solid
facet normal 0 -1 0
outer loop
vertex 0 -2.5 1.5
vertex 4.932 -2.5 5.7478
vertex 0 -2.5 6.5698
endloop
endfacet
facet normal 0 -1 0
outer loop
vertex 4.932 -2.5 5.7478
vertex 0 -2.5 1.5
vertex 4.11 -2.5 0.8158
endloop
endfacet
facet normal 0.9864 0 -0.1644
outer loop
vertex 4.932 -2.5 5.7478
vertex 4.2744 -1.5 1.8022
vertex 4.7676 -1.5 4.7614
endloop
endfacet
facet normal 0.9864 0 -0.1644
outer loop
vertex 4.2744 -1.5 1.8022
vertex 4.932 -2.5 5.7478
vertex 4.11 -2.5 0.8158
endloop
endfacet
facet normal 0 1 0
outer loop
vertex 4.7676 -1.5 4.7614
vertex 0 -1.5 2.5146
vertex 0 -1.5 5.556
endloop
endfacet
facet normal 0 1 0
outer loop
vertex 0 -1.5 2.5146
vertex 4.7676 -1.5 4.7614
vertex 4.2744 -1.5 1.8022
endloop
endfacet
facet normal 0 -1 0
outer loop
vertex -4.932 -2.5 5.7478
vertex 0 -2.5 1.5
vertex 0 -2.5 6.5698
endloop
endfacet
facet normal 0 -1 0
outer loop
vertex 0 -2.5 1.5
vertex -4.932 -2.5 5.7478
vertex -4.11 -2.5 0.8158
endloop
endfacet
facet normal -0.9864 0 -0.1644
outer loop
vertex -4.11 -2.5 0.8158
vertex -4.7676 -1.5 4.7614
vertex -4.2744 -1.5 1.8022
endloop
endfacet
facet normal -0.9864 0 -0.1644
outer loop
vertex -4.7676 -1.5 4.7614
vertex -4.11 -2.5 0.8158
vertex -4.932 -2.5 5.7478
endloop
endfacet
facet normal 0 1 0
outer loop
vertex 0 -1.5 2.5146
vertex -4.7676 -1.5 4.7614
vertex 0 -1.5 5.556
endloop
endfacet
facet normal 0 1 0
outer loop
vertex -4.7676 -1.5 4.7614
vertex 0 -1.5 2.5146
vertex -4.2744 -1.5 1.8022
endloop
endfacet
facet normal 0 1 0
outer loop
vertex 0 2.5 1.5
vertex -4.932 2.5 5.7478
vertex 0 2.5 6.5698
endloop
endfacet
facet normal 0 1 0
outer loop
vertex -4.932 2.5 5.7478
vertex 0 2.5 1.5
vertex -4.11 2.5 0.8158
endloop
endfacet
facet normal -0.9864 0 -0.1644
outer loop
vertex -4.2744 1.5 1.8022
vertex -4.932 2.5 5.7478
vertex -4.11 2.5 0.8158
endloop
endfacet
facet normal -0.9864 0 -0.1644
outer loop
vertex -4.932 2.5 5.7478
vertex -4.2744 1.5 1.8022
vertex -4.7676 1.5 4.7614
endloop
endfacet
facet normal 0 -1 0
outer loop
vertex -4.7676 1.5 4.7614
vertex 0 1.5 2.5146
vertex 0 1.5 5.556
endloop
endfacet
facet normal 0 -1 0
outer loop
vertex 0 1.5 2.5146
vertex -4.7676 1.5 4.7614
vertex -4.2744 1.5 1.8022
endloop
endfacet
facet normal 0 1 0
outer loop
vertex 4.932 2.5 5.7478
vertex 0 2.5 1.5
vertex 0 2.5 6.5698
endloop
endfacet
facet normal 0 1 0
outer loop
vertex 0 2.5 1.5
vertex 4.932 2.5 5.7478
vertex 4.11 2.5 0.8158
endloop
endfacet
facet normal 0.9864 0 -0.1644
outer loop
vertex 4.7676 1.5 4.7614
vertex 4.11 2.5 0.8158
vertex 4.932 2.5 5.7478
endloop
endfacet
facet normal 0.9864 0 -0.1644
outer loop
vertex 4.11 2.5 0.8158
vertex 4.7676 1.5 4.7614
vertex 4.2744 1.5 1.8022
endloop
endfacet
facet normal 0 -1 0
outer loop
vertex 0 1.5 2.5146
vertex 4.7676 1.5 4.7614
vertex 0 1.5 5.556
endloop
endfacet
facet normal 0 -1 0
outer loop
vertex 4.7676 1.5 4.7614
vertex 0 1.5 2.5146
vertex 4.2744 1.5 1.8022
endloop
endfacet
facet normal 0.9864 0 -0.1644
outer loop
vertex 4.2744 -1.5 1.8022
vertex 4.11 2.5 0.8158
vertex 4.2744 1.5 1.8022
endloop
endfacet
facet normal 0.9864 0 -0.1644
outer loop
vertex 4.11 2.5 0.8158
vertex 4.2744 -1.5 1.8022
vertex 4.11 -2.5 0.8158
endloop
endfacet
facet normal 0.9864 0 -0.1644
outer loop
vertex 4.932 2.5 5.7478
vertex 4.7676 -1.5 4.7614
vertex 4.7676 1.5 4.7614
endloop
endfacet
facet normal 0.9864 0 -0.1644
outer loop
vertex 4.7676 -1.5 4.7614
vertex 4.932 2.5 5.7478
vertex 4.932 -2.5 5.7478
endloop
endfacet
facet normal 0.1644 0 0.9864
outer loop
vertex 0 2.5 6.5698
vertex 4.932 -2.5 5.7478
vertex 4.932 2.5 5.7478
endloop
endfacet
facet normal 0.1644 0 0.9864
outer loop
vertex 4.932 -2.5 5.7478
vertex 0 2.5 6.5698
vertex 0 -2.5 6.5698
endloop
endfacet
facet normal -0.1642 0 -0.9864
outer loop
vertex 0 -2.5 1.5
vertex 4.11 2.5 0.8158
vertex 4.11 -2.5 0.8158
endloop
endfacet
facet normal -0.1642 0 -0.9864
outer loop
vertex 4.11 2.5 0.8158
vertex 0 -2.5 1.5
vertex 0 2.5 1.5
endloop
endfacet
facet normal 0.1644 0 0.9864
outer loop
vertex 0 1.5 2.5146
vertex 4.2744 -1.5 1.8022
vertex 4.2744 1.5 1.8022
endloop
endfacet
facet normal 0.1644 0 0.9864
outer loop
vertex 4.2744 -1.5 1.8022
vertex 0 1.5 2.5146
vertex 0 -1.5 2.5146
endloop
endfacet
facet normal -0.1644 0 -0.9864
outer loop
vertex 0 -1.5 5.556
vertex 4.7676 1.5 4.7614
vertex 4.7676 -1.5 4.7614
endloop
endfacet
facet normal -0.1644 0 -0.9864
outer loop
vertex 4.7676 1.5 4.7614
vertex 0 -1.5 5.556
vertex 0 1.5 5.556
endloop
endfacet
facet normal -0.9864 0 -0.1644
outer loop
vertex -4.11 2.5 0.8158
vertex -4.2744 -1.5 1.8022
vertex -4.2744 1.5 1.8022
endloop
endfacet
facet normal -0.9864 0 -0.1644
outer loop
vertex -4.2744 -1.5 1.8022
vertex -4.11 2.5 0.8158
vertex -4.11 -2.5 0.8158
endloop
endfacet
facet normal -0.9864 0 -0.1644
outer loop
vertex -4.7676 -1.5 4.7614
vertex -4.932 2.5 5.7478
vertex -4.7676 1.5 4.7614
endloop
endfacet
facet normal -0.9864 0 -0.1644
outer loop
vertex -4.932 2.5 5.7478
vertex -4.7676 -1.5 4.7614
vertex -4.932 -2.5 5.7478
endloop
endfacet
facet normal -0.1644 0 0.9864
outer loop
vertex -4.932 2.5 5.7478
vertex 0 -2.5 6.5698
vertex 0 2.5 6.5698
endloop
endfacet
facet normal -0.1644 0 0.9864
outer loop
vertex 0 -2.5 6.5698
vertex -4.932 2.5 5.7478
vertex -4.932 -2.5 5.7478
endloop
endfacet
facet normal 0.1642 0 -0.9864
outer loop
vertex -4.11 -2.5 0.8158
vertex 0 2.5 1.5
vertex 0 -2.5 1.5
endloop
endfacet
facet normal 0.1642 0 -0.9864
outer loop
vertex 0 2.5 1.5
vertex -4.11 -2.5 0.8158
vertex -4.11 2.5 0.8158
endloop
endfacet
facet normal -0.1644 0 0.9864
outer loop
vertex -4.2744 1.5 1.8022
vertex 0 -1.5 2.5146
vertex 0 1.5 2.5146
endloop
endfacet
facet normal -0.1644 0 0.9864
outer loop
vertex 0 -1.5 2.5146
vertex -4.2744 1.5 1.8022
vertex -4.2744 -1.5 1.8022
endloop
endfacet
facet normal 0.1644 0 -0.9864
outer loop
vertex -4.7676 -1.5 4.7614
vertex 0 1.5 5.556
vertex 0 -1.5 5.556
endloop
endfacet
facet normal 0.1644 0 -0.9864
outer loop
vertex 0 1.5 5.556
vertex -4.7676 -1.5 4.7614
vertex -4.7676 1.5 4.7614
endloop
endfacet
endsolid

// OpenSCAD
// file: s/u7035s01.scad
use <../../lib.scad>
function ldraw_lib__s__u7035s01() = [
// 0 ~Modulex Angled Brick 9 2 x 1 Double - Side
// 0 Name: s\u7035s01.dat
// 0 Author: Magnus Forsberg [MagFors]
// 0 !LDRAW_ORG Subpart UPDATE 2025-09
// 0 !LICENSE Licensed under CC BY 4.0 : see CAreadme.txt
// 
// 0 BFC CERTIFY CCW
  [0,"BFC","CERTIFY"],
  [0,"BFC","CCW"],
// 
// 0 !HISTORY 2025-09-29 [OrionP] Official Update 2025-09
// 
// 4 16 0 -16.4245 0 0 -3.75 0 10.274942 -2.039593 0 12.329925 -14.369517 0
  [4,16,0,-16.4245,0,0,-3.75,0,10.274942,-2.039593,0,12.329925,-14.369517,0],
// 4 16 10.274942 -2.039593 0 10.685939 -4.505578 2.5 11.918928 -11.903532 2.5 12.329925 -14.369517 0
  [4,16,10.274942,-2.039593,0,10.685939,-4.505578,2.5,11.918928,-11.903532,2.5,12.329925,-14.369517,0],
// 4 16 0 -6.286563 2.5 0 -13.890016 2.5 11.918928 -11.903532 2.5 10.685939 -4.505578 2.5
  [4,16,0,-6.286563,2.5,0,-13.890016,2.5,11.918928,-11.903532,2.5,10.685939,-4.505578,2.5],
// 2 24 10.685939 -4.505578 2.5 11.918928 -11.903532 2.5
  [2,24,10.685939,-4.505578,2.5,11.918928,-11.903532,2.5],
// 2 24 12.329925 -14.369517 0 10.274942 -2.039593 0
  [2,24,12.329925,-14.369517,0,10.274942,-2.039593,0],
// 2 24 10.274942 -2.039593 0 0 -3.75 0
  [2,24,10.274942,-2.039593,0,0,-3.75,0],
// 2 24 0 -6.286563 2.5 10.685939 -4.505578 2.5
  [2,24,0,-6.286563,2.5,10.685939,-4.505578,2.5],
// 2 24 0 -13.890016 2.5 11.918928 -11.903532 2.5
  [2,24,0,-13.890016,2.5,11.918928,-11.903532,2.5],
// 2 24 0 -16.4245 0 12.329925 -14.369517 0
  [2,24,0,-16.4245,0,12.329925,-14.369517,0],
// 4 16 -10.274942 -2.039593 0 0 -3.75 0 0 -16.4245 0 -12.329925 -14.369517 0
  [4,16,-10.274942,-2.039593,0,0,-3.75,0,0,-16.4245,0,-12.329925,-14.369517,0],
// 4 16 -11.918928 -11.903532 2.5 -10.685939 -4.505578 2.5 -10.274942 -2.039593 0 -12.329925 -14.369517 0
  [4,16,-11.918928,-11.903532,2.5,-10.685939,-4.505578,2.5,-10.274942,-2.039593,0,-12.329925,-14.369517,0],
// 4 16 -11.918928 -11.903532 2.5 0 -13.890016 2.5 0 -6.286563 2.5 -10.685939 -4.505578 2.5
  [4,16,-11.918928,-11.903532,2.5,0,-13.890016,2.5,0,-6.286563,2.5,-10.685939,-4.505578,2.5],
// 2 24 -11.918928 -11.903532 2.5 -10.685939 -4.505578 2.5
  [2,24,-11.918928,-11.903532,2.5,-10.685939,-4.505578,2.5],
// 2 24 -10.274942 -2.039593 0 -12.329925 -14.369517 0
  [2,24,-10.274942,-2.039593,0,-12.329925,-14.369517,0],
// 2 24 0 -3.75 0 -10.274942 -2.039593 0
  [2,24,0,-3.75,0,-10.274942,-2.039593,0],
// 2 24 -10.685939 -4.505578 2.5 0 -6.286563 2.5
  [2,24,-10.685939,-4.505578,2.5,0,-6.286563,2.5],
// 2 24 -11.918928 -11.903532 2.5 0 -13.890016 2.5
  [2,24,-11.918928,-11.903532,2.5,0,-13.890016,2.5],
// 2 24 -12.329925 -14.369517 0 0 -16.4245 0
  [2,24,-12.329925,-14.369517,0,0,-16.4245,0],
];
module ldraw_lib__s__u7035s01(step=0, col=false, unit=2/5, alt=false, line=0.2, solid=!$preview)
    makepoly(ldraw_lib__s__u7035s01(), step=step, col=col, unit=unit, alt=alt, line=line, solid=solid);
ldraw_lib__s__u7035s01(line=0.2);
// main file
use <../lib.scad>
use <s/u7035s01.scad>
function ldraw_lib__u7035() = [
// 0 Modulex Brick Angled 9 2 x 1 Double
// 0 Name: u7035.dat
// 0 Author: Magnus Forsberg [MagFors]
// 0 !LDRAW_ORG Part UPDATE 2025-09
// 0 !LICENSE Licensed under CC BY 4.0 : see CAreadme.txt
// 
// 0 !HELP 1 16 25 12.5 0 1 0 0 0 1 0 0 0 1 u7033.dat
// 0 !HELP 1 35 11.302 -8.205 0 0 .986 .164 0 .164 -.986 -1 0 0 u7000.dat
// 
// 0 BFC CERTIFY CCW
  [0,"BFC","CERTIFY"],
  [0,"BFC","CCW"],
// 
// 0 !KEYWORDS 9.4623 degree, Bricklink Mx2406A, Rebrickable 2406A, slope 1:6
// 
// 0 !HISTORY 2025-09-29 [OrionP] Official Update 2025-09
// 
// 1 16 0 0 -6.25 1 0 0 0 1 0 0 0 1 s\u7035s01.dat
  [1,16,0,0,-6.25,1,0,0,0,1,0,0,0,1, ldraw_lib__s__u7035s01()],
// 1 16 0 0 6.25 -1 0 0 0 1 0 0 0 -1 s\u7035s01.dat
  [1,16,0,0,6.25,-1,0,0,0,1,0,0,0,-1, ldraw_lib__s__u7035s01()],
// 
// 2 24 0 -13.890016 3.75 0 -13.890016 -3.75
  [2,24,0,-13.890016,3.75,0,-13.890016,-3.75],
// 2 24 0 -6.286563 -3.75 0 -6.286563 3.75
  [2,24,0,-6.286563,-3.75,0,-6.286563,3.75],
// 2 24 0 -16.4245 -6.25 0 -16.4245 6.25
  [2,24,0,-16.4245,-6.25,0,-16.4245,6.25],
// 2 24 0 -3.75 -6.25 0 -3.75 6.25
  [2,24,0,-3.75,-6.25,0,-3.75,6.25],
// 
// 4 16 10.274942 -2.039593 -6.25 10.274942 -2.039593 6.25 10.685939 -4.505578 3.75 10.685939 -4.505578 -3.75
  [4,16,10.274942,-2.039593,-6.25,10.274942,-2.039593,6.25,10.685939,-4.505578,3.75,10.685939,-4.505578,-3.75],
// 4 16 12.329925 -14.369517 -6.25 11.918928 -11.903532 -3.75 11.918928 -11.903532 3.75 12.329925 -14.369517 6.25
  [4,16,12.329925,-14.369517,-6.25,11.918928,-11.903532,-3.75,11.918928,-11.903532,3.75,12.329925,-14.369517,6.25],
// 4 16 12.329925 -14.369517 -6.25 12.329925 -14.369517 6.25 0 -16.4245 6.25 0 -16.4245 -6.25
  [4,16,12.329925,-14.369517,-6.25,12.329925,-14.369517,6.25,0,-16.4245,6.25,0,-16.4245,-6.25],
// 4 16 0 -3.75 6.25 10.274942 -2.039593 6.25 10.274942 -2.039593 -6.25 0 -3.75 -6.25
  [4,16,0,-3.75,6.25,10.274942,-2.039593,6.25,10.274942,-2.039593,-6.25,0,-3.75,-6.25],
// 
// 4 16 0 -6.286563 3.75 0 -6.286563 -3.75 10.685939 -4.505578 -3.75 10.685939 -4.505578 3.75
  [4,16,0,-6.286563,3.75,0,-6.286563,-3.75,10.685939,-4.505578,-3.75,10.685939,-4.505578,3.75],
// 4 16 0 -13.890016 3.75 11.918928 -11.903532 3.75 11.918928 -11.903532 -3.75 0 -13.890016 -3.75
  [4,16,0,-13.890016,3.75,11.918928,-11.903532,3.75,11.918928,-11.903532,-3.75,0,-13.890016,-3.75],
// 
// 2 24 12.329925 -14.369517 -6.25 12.329925 -14.369517 6.25
  [2,24,12.329925,-14.369517,-6.25,12.329925,-14.369517,6.25],
// 2 24 11.918928 -11.903532 -3.75 11.918928 -11.903532 3.75
  [2,24,11.918928,-11.903532,-3.75,11.918928,-11.903532,3.75],
// 2 24 10.274942 -2.039593 -6.25 10.274942 -2.039593 6.25
  [2,24,10.274942,-2.039593,-6.25,10.274942,-2.039593,6.25],
// 2 24 10.685939 -4.505578 3.75 10.685939 -4.505578 -3.75
  [2,24,10.685939,-4.505578,3.75,10.685939,-4.505578,-3.75],
// 
// 4 16 -10.685939 -4.505578 3.75 -10.274942 -2.039593 6.25 -10.274942 -2.039593 -6.25 -10.685939 -4.505578 -3.75
  [4,16,-10.685939,-4.505578,3.75,-10.274942,-2.039593,6.25,-10.274942,-2.039593,-6.25,-10.685939,-4.505578,-3.75],
// 4 16 -11.918928 -11.903532 3.75 -11.918928 -11.903532 -3.75 -12.329925 -14.369517 -6.25 -12.329925 -14.369517 6.25
  [4,16,-11.918928,-11.903532,3.75,-11.918928,-11.903532,-3.75,-12.329925,-14.369517,-6.25,-12.329925,-14.369517,6.25],
// 4 16 0 -16.4245 6.25 -12.329925 -14.369517 6.25 -12.329925 -14.369517 -6.25 0 -16.4245 -6.25
  [4,16,0,-16.4245,6.25,-12.329925,-14.369517,6.25,-12.329925,-14.369517,-6.25,0,-16.4245,-6.25],
// 4 16 -10.274942 -2.039593 -6.25 -10.274942 -2.039593 6.25 0 -3.75 6.25 0 -3.75 -6.25
  [4,16,-10.274942,-2.039593,-6.25,-10.274942,-2.039593,6.25,0,-3.75,6.25,0,-3.75,-6.25],
// 4 16 -10.685939 -4.505578 -3.75 0 -6.286563 -3.75 0 -6.286563 3.75 -10.685939 -4.505578 3.75
  [4,16,-10.685939,-4.505578,-3.75,0,-6.286563,-3.75,0,-6.286563,3.75,-10.685939,-4.505578,3.75],
// 4 16 -11.918928 -11.903532 -3.75 -11.918928 -11.903532 3.75 0 -13.890016 3.75 0 -13.890016 -3.75
  [4,16,-11.918928,-11.903532,-3.75,-11.918928,-11.903532,3.75,0,-13.890016,3.75,0,-13.890016,-3.75],
// 2 24 -12.329925 -14.369517 6.25 -12.329925 -14.369517 -6.25
  [2,24,-12.329925,-14.369517,6.25,-12.329925,-14.369517,-6.25],
// 2 24 -11.918928 -11.903532 3.75 -11.918928 -11.903532 -3.75
  [2,24,-11.918928,-11.903532,3.75,-11.918928,-11.903532,-3.75],
// 2 24 -10.274942 -2.039593 6.25 -10.274942 -2.039593 -6.25
  [2,24,-10.274942,-2.039593,6.25,-10.274942,-2.039593,-6.25],
// 2 24 -10.685939 -4.505578 -3.75 -10.685939 -4.505578 3.75
  [2,24,-10.685939,-4.505578,-3.75,-10.685939,-4.505578,3.75],
];
module ldraw_lib__u7035(step=0, col=false, unit=2/5, alt=false, line=0.2, solid=!$preview)
    makepoly(ldraw_lib__u7035(), step=step, col=col, unit=unit, alt=alt, line=line, solid=solid);
ldraw_lib__u7035(line=0.2);
